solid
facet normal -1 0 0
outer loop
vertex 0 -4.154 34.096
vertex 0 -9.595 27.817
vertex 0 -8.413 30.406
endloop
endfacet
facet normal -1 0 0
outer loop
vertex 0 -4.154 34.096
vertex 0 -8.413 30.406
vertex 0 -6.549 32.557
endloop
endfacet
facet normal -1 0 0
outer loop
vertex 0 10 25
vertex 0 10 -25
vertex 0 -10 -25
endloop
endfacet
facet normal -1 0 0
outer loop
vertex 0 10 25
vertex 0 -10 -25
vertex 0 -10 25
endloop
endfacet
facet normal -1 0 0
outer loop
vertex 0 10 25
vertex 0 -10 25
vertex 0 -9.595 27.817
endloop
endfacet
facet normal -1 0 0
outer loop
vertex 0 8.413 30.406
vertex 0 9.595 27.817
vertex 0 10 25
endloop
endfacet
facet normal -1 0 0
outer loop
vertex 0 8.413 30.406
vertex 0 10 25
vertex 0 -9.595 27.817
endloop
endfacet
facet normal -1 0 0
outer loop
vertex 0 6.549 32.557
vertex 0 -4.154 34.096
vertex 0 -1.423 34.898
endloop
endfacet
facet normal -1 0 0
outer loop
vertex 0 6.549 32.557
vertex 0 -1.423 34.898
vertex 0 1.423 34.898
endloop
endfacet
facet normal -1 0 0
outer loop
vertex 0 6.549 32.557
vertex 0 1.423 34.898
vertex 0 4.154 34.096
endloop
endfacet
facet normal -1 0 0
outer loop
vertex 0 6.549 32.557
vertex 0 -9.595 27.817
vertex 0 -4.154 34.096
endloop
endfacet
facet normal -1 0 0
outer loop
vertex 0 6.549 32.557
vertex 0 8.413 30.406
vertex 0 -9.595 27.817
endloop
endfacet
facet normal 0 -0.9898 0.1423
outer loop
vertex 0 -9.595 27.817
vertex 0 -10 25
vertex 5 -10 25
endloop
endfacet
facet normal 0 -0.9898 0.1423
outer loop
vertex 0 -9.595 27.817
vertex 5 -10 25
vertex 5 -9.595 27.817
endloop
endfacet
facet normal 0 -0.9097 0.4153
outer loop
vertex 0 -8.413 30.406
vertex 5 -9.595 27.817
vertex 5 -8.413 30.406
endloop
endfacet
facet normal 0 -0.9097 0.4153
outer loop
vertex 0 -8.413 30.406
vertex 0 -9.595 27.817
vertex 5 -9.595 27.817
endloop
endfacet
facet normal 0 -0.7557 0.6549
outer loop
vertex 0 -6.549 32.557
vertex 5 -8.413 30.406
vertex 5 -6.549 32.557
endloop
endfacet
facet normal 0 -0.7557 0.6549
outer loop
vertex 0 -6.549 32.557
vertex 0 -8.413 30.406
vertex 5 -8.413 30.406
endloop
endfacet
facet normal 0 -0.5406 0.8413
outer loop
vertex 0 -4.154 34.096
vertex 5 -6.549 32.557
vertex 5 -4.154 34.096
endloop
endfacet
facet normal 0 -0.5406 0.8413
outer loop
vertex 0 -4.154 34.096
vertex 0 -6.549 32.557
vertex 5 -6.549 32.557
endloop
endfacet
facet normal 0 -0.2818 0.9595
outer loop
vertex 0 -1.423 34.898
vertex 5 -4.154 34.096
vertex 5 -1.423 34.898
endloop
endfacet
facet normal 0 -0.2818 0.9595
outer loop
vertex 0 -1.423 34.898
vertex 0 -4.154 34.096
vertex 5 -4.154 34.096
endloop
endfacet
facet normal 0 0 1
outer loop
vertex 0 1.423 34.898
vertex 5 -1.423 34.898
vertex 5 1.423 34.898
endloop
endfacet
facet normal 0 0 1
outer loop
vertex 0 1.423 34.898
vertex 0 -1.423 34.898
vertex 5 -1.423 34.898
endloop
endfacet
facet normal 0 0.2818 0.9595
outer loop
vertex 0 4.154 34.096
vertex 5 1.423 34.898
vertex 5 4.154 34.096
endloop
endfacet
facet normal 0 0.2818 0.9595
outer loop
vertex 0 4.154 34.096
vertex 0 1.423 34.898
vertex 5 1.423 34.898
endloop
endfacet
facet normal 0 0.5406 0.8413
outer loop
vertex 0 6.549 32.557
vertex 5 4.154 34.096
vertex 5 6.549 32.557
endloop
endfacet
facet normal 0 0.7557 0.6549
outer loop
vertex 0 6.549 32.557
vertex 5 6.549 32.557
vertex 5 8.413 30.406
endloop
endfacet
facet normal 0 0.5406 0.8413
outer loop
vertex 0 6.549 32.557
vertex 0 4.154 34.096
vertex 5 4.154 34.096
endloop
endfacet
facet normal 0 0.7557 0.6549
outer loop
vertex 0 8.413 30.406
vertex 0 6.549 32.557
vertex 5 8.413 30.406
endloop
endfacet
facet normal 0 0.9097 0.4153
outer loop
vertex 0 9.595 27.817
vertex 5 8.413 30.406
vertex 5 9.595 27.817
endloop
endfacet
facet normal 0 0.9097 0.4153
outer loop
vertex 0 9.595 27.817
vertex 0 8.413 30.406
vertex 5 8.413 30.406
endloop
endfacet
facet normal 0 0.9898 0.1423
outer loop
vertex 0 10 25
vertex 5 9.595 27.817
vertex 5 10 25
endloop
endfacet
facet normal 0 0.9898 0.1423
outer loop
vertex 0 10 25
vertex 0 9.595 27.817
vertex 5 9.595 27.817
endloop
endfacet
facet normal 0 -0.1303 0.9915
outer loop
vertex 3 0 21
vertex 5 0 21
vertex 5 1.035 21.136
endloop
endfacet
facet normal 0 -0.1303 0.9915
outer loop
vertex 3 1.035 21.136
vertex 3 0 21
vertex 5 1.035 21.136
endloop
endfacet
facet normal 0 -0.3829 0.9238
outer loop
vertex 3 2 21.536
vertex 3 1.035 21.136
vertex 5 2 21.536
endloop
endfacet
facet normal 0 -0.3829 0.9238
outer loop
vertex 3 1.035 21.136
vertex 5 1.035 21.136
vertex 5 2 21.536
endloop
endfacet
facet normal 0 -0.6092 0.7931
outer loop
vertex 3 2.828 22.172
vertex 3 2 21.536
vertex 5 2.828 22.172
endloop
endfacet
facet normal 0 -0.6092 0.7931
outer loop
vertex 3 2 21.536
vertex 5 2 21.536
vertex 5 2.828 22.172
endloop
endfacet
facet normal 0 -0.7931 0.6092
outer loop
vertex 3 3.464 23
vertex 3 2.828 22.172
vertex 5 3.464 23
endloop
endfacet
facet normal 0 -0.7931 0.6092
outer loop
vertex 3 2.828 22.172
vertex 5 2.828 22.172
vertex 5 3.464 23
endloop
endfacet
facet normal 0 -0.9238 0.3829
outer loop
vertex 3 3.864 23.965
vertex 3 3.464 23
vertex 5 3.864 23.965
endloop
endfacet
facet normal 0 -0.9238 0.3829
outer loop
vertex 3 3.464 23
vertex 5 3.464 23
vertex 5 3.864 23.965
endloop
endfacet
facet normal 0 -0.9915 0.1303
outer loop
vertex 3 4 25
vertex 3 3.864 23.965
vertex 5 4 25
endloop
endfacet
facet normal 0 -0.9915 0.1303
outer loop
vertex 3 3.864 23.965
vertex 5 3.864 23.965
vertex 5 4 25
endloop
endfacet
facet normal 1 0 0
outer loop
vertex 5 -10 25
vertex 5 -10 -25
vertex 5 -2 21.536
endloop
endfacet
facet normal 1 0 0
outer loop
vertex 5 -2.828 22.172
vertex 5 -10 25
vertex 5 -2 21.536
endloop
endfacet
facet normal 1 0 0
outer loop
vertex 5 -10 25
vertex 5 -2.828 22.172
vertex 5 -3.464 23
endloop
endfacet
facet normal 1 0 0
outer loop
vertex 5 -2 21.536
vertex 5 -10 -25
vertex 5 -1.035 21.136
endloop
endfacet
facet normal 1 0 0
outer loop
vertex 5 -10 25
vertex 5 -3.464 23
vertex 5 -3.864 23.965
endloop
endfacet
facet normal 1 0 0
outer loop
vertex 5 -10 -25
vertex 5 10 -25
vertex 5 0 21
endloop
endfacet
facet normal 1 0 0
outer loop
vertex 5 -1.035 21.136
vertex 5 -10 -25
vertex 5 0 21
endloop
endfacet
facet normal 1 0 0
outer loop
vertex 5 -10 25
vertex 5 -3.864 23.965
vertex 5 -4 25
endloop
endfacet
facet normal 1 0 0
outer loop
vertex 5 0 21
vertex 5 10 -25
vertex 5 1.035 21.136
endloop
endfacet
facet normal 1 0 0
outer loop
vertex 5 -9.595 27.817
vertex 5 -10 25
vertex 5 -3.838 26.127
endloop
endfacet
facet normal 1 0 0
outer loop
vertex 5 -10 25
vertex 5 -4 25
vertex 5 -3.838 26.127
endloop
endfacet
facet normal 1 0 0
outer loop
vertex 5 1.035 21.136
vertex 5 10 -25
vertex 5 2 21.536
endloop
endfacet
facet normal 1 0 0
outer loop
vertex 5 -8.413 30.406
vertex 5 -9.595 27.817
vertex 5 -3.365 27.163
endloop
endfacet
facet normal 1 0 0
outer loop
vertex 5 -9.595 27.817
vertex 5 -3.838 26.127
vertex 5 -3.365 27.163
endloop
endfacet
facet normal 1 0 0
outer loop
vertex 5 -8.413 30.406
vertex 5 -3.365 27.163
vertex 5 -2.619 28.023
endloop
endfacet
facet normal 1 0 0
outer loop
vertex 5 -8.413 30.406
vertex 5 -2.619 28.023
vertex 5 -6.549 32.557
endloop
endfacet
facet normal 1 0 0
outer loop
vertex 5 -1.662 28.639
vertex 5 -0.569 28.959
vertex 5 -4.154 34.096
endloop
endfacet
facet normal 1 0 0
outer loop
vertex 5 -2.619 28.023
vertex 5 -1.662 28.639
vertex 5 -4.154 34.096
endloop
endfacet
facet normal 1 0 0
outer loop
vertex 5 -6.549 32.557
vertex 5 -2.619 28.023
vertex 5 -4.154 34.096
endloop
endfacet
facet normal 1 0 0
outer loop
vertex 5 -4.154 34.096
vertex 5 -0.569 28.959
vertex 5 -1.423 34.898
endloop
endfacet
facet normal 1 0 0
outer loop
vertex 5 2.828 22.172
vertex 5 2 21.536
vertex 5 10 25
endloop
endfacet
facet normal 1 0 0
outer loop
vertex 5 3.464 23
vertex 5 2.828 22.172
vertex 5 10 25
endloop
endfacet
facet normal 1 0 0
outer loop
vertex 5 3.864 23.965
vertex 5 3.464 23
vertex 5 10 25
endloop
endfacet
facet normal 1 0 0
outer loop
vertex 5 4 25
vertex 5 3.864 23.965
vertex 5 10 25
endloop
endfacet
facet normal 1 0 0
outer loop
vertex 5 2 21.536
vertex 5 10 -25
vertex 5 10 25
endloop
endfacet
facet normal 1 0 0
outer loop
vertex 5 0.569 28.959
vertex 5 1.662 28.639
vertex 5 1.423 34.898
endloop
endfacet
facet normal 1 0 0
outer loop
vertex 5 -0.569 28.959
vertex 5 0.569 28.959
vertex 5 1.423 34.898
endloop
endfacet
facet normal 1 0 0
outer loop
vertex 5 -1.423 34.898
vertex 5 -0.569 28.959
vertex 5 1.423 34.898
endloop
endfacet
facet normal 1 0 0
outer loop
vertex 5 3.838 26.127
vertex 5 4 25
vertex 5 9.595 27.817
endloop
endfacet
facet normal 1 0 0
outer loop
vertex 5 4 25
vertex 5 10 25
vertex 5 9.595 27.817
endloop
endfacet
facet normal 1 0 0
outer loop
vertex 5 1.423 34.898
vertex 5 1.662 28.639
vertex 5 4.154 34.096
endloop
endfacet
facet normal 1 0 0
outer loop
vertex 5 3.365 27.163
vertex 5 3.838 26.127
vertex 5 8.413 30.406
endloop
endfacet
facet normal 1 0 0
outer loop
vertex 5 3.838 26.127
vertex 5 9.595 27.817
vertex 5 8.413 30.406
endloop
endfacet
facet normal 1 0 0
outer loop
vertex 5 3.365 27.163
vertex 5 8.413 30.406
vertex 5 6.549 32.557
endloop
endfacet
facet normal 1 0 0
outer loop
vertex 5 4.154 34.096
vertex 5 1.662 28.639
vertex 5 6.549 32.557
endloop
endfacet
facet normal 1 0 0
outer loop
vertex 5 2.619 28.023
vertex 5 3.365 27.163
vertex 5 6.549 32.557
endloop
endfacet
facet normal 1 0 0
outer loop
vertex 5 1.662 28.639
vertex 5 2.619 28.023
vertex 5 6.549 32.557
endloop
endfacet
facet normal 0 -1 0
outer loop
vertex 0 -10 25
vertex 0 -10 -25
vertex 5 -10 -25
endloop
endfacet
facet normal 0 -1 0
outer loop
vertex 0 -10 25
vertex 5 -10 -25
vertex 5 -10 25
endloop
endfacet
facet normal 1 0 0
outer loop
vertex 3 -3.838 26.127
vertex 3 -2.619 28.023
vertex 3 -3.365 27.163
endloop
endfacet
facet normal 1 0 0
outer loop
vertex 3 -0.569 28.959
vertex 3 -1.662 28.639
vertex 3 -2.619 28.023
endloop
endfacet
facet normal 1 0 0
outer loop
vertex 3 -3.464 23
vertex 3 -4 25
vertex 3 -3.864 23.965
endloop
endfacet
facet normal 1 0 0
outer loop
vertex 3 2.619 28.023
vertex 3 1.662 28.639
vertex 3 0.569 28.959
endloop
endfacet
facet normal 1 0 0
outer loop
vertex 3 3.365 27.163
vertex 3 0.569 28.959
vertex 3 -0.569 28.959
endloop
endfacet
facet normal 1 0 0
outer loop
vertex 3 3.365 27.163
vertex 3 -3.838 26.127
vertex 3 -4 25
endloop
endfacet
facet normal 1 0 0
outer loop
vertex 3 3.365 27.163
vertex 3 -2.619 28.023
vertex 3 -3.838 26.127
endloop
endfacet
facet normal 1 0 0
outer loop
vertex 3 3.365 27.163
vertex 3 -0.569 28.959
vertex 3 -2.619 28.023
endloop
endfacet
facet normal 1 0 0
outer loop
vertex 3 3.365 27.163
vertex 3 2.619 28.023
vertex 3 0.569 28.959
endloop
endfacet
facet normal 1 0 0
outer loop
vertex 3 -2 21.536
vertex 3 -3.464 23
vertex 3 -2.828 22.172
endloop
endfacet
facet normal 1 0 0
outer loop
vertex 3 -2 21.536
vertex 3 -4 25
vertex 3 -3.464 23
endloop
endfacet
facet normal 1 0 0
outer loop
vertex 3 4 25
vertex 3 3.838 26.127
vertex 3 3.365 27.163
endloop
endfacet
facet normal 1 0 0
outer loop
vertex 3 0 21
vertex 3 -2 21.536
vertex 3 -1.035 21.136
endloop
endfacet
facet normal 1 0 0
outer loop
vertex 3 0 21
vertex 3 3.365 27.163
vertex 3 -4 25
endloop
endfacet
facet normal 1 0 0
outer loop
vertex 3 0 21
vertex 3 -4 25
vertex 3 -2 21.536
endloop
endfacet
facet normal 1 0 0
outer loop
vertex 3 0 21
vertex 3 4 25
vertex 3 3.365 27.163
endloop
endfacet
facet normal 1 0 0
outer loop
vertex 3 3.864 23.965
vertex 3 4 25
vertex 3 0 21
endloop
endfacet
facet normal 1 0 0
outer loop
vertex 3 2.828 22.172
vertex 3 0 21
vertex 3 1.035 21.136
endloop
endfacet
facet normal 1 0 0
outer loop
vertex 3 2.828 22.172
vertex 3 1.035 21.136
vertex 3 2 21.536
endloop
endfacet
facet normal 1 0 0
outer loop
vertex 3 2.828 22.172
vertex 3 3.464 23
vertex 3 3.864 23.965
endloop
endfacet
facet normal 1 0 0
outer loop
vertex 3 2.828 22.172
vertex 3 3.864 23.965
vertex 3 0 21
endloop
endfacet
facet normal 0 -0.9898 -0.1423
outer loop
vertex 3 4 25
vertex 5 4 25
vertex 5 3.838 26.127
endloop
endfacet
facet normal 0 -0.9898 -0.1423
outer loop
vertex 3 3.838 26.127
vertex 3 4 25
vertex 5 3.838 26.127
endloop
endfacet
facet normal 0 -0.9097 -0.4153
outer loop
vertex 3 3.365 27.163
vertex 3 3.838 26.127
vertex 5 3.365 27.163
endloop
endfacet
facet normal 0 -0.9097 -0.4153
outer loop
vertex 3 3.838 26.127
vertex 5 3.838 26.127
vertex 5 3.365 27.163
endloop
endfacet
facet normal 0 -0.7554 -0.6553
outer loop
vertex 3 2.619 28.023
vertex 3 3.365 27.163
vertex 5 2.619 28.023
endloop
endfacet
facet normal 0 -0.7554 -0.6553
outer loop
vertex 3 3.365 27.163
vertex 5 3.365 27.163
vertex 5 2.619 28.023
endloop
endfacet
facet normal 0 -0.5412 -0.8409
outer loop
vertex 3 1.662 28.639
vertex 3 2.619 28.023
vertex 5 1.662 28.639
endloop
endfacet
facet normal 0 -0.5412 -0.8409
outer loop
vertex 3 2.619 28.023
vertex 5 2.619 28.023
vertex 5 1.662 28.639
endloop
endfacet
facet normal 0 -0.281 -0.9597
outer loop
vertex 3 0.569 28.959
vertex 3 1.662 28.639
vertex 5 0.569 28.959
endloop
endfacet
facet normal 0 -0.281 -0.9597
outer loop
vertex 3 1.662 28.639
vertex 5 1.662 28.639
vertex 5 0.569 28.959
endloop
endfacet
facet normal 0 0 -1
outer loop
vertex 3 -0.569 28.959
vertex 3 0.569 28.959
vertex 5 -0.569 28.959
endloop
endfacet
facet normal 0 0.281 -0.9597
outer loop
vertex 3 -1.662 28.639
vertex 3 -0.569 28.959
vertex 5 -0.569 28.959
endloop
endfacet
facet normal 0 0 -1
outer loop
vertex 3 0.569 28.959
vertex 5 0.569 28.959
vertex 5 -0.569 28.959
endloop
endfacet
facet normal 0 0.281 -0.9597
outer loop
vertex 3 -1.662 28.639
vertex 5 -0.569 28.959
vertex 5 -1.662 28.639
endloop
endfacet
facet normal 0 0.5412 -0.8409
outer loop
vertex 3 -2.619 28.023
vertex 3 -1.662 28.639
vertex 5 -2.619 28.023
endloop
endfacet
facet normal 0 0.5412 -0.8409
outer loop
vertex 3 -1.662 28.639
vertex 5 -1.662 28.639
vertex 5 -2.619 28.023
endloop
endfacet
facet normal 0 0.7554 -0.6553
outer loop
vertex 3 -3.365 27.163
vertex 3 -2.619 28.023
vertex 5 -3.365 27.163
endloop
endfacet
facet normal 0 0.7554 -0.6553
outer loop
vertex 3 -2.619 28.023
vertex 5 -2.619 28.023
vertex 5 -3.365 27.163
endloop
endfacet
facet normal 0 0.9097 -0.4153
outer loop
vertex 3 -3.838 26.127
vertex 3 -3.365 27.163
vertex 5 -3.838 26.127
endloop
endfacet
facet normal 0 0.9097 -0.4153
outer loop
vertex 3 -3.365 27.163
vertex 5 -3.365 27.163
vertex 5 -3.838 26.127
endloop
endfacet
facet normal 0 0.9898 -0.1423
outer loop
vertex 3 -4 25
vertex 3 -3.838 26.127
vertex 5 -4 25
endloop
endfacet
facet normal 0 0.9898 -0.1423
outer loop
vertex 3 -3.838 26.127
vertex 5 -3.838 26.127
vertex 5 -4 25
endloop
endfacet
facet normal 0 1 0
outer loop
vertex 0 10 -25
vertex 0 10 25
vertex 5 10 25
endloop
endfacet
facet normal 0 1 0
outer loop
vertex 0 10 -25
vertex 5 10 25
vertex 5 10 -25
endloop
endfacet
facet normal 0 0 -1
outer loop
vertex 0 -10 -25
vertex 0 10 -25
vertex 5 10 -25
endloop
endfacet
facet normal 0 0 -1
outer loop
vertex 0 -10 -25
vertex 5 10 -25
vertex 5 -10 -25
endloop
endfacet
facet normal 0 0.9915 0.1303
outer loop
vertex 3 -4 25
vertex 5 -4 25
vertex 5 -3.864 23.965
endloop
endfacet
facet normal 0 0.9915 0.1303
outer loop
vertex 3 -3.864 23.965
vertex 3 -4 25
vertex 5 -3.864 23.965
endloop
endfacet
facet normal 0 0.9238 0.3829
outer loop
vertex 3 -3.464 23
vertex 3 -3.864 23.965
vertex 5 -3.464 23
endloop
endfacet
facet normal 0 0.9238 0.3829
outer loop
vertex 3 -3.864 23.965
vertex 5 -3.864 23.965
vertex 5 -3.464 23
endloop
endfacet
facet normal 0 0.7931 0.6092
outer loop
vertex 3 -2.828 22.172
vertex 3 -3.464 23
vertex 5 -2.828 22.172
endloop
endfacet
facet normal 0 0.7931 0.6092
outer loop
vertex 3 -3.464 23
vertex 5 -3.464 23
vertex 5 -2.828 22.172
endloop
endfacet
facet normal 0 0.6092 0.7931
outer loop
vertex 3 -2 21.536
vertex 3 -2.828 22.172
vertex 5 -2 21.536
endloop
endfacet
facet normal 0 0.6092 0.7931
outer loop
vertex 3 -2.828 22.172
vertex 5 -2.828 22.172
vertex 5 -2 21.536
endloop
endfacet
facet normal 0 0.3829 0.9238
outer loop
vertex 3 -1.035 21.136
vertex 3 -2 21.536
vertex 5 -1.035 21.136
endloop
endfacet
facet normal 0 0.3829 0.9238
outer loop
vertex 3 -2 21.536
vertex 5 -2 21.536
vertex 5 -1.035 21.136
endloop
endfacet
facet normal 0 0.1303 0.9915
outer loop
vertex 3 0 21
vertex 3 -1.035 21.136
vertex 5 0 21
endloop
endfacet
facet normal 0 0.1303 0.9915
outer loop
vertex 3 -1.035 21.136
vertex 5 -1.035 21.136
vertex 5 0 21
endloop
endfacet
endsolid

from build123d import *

# Parameters (mm, degrees)
BOSS_EXTRUDE1_DEPTH = 5
CUT_EXTRUDE3_DEPTH  = 2


with BuildPart() as part:
    # Sketch1 → Boss-Extrude1 (new body)
    with BuildSketch(Plane(origin=(0, 0, 0), x_dir=(0, 0, -1), z_dir=(1, 0, 0))):
        with BuildLine():
            Line((-25, 10), (25, 10))
            Line((25, 10), (25, -10))
            Line((25, -10), (-25, -10))
            ThreePointArc((-25, -10), (-35, 0), (-25, 10))
        make_face()
    extrude(amount=BOSS_EXTRUDE1_DEPTH)

    # Sketch2 → Cut-Extrude3 (cut)
    with BuildSketch(Plane(origin=(5, 0, 0), x_dir=(0, 0, -1), z_dir=(1, 0, 0))):
        with BuildLine():
            ThreePointArc((-21, 0), (-22.171572875, 2.828427125), (-25, 4))
            Line((-25, 4), (-25, -4))
            ThreePointArc((-25, -4), (-22.171572875, -2.828427125), (-21, 0))
        make_face()
        with BuildLine():
            Line((-25, -4), (-25, 4))
            ThreePointArc((-25, 4), (-29, 0), (-25, -4))
        make_face()
    extrude(amount=-CUT_EXTRUDE3_DEPTH, mode=Mode.SUBTRACT)


solid = part.part
